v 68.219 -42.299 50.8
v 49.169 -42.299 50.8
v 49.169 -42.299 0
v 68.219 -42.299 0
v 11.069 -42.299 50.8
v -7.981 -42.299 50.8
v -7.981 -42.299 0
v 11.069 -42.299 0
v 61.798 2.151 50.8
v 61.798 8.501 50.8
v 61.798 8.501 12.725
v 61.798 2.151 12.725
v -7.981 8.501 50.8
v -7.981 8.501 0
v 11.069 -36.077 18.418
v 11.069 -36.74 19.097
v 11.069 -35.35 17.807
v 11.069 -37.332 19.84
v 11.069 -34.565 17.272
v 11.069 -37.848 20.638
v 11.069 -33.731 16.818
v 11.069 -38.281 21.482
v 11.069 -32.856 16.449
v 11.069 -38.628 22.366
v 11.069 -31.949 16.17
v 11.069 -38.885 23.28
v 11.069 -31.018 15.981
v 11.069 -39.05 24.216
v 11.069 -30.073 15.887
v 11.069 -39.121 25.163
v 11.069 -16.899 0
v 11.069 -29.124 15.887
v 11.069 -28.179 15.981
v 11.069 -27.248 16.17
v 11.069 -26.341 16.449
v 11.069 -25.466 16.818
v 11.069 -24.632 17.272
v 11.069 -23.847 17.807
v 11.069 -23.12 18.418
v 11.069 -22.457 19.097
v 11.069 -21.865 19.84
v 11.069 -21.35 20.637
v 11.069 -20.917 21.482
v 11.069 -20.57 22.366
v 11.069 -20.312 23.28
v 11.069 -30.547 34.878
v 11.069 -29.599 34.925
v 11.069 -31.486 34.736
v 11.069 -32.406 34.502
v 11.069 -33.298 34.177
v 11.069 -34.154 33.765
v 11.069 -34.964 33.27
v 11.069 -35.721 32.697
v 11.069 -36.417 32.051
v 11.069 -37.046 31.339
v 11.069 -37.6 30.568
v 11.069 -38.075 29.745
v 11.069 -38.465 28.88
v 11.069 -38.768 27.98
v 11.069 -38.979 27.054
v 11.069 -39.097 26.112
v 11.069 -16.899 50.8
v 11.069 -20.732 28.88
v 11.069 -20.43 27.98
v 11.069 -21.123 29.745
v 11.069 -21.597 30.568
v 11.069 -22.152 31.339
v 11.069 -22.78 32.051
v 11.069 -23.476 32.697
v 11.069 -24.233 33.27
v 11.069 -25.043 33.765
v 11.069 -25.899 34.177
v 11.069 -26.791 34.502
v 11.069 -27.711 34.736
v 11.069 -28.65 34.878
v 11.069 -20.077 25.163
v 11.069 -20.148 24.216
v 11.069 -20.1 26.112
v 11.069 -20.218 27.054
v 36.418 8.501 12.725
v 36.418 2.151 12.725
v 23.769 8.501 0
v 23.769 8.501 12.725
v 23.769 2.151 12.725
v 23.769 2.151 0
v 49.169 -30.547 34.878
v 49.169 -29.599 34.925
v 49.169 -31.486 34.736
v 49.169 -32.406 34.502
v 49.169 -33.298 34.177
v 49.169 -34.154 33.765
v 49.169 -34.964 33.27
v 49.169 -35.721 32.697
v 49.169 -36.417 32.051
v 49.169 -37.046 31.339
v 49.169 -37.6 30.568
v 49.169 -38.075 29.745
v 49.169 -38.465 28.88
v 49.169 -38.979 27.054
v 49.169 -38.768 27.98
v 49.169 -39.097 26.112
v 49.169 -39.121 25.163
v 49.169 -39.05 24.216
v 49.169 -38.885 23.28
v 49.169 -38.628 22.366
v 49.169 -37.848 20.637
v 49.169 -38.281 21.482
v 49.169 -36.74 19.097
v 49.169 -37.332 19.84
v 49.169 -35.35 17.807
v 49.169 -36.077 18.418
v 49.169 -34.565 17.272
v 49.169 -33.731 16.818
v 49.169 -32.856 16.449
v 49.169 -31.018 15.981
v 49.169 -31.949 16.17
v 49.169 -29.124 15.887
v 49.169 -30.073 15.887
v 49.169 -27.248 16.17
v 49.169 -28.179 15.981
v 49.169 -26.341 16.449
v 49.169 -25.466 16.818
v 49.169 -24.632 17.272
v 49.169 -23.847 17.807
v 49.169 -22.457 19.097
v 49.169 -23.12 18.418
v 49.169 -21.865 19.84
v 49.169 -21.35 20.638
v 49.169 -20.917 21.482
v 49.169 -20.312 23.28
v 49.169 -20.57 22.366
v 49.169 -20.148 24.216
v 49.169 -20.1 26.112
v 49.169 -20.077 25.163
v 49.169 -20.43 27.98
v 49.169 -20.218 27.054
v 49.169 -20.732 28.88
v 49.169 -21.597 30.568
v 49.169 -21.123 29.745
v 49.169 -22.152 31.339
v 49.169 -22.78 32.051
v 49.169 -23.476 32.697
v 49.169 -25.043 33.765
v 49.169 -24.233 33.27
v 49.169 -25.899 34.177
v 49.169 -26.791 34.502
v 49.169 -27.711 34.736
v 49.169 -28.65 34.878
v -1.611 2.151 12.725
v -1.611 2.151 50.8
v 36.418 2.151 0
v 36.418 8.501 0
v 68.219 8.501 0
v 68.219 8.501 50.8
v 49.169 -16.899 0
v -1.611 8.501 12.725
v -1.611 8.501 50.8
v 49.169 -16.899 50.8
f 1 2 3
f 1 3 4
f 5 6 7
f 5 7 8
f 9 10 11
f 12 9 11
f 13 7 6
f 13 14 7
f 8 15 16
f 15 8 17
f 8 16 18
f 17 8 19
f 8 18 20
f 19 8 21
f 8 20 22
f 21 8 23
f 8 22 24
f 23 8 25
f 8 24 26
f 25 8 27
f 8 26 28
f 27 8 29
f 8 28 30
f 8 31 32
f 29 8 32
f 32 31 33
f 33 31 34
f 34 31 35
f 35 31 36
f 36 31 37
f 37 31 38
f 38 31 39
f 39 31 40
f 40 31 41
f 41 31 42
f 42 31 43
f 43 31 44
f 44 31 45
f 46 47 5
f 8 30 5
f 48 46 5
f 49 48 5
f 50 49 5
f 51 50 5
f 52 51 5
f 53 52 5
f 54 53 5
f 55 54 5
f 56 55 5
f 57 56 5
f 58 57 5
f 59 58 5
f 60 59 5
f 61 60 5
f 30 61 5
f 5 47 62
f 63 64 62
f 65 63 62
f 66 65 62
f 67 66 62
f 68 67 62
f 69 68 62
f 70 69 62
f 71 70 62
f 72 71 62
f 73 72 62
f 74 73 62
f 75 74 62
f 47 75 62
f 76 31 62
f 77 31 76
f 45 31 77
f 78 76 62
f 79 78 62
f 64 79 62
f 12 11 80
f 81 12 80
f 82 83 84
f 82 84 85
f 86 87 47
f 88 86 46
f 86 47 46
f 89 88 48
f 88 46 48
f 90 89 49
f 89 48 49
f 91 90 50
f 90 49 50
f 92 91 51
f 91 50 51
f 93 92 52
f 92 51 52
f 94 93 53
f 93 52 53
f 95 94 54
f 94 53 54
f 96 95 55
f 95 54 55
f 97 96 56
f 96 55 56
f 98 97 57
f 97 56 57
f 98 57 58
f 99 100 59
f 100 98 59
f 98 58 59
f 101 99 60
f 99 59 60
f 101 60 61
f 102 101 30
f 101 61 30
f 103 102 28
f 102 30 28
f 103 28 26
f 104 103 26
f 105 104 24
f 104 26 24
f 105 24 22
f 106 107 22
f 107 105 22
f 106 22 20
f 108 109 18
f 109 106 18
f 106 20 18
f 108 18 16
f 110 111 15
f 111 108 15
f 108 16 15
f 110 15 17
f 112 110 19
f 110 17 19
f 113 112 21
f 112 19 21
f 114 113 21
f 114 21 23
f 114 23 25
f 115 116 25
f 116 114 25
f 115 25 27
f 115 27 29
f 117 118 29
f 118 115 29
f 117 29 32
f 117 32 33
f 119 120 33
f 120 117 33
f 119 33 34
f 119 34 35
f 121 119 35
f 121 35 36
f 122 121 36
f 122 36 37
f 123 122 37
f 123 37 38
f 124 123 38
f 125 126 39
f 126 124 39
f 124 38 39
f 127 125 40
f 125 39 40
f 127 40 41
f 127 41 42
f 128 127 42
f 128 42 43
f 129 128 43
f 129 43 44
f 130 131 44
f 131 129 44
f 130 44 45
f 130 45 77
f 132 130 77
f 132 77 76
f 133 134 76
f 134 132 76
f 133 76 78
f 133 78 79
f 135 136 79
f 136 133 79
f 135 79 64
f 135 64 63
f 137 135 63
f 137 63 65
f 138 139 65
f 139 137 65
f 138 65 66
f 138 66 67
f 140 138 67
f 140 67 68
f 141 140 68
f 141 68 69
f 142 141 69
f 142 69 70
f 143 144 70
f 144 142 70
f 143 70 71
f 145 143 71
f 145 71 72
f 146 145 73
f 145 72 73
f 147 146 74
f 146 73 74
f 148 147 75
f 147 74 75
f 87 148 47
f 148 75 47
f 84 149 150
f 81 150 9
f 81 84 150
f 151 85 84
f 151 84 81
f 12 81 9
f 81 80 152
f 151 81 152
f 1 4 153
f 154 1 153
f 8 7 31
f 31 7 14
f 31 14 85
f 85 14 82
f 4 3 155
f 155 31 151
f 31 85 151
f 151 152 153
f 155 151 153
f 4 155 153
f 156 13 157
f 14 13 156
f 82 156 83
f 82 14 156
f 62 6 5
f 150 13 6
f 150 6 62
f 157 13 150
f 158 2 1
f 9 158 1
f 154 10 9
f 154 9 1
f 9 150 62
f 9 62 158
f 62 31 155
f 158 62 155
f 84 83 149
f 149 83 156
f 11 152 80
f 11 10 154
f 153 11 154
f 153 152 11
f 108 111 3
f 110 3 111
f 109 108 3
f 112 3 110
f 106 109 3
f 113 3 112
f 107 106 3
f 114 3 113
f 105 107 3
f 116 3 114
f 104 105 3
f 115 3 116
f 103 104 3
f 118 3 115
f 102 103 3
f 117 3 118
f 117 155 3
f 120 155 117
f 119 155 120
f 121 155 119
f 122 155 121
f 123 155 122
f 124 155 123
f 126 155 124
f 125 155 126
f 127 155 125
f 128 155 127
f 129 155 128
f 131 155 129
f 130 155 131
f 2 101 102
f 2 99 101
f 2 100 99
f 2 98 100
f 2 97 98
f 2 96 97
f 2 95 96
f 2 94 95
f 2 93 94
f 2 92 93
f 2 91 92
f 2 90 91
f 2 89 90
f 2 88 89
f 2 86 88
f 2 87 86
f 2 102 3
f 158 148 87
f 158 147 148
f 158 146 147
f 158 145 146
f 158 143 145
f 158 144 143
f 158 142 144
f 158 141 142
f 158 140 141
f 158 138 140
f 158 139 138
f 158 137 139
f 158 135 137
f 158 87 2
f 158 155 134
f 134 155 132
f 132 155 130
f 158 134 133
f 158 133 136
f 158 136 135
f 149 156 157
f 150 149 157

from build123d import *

# Parameters (mm, degrees)
SKETCH2_W           = 76.2
SKETCH2_H           = 25.4
BOSS_EXTRUDE1_DEPTH = 50.8
SKETCH3_W           = 19.05
SKETCH3_H           = 50.8
BOSS_EXTRUDE2_DEPTH = 25.4
SKETCH4_R           = 9.525
BOSS_EXTRUDE3_DEPTH = 50.8
SKETCH7_W           = 12.6492
SKETCH7_H           = 12.7254
CUT_EXTRUDE1_DEPTH  = 6.35


with BuildPart() as part:
    # Sketch2 → Boss-Extrude1 (new body)
    with BuildSketch(Plane.XY):
        with Locations((30.119125683, -4.19863388)):
            Rectangle(SKETCH2_W, SKETCH2_H)
    extrude(amount=BOSS_EXTRUDE1_DEPTH)

    # Sketch3 → Boss-Extrude2 (add)
    with BuildSketch(Plane.XZ.offset(16.89863388)):
        with Locations((1.544125683, 25.4)):
            Rectangle(SKETCH3_W, SKETCH3_H)
        with Locations((58.694125683, 25.4)):
            Rectangle(SKETCH3_W, SKETCH3_H)
    extrude(amount=BOSS_EXTRUDE2_DEPTH)

    # Sketch4 → Boss-Extrude3 (add)
    with BuildSketch(Plane(origin=(11.069125683, 0, 0), x_dir=(0, 0, -1), z_dir=(1, 0, 0))):
        with Locations(Location((-25.4, -29.59863388, 0), (0, 0, 180))):
            Circle(SKETCH4_R)
    extrude(amount=BOSS_EXTRUDE3_DEPTH)

    # Sketch7 → Cut-Extrude1 (cut)
    with BuildSketch(Plane(origin=(0, 8.50136612, 0), x_dir=(1, 0, 0), z_dir=(0, 1, 0))):
        Polygon((-1.610554317, -12.7254), (-1.610554317, -50.8), (61.798005683, -50.8), (61.798005683, -12.7254), (36.418325683, -12.7254), (23.769125683, -12.7254), align=None)
        with Locations((30.093725683, -6.3627)):
            Rectangle(SKETCH7_W, SKETCH7_H)
    extrude(amount=-CUT_EXTRUDE1_DEPTH, mode=Mode.SUBTRACT)


solid = part.part
